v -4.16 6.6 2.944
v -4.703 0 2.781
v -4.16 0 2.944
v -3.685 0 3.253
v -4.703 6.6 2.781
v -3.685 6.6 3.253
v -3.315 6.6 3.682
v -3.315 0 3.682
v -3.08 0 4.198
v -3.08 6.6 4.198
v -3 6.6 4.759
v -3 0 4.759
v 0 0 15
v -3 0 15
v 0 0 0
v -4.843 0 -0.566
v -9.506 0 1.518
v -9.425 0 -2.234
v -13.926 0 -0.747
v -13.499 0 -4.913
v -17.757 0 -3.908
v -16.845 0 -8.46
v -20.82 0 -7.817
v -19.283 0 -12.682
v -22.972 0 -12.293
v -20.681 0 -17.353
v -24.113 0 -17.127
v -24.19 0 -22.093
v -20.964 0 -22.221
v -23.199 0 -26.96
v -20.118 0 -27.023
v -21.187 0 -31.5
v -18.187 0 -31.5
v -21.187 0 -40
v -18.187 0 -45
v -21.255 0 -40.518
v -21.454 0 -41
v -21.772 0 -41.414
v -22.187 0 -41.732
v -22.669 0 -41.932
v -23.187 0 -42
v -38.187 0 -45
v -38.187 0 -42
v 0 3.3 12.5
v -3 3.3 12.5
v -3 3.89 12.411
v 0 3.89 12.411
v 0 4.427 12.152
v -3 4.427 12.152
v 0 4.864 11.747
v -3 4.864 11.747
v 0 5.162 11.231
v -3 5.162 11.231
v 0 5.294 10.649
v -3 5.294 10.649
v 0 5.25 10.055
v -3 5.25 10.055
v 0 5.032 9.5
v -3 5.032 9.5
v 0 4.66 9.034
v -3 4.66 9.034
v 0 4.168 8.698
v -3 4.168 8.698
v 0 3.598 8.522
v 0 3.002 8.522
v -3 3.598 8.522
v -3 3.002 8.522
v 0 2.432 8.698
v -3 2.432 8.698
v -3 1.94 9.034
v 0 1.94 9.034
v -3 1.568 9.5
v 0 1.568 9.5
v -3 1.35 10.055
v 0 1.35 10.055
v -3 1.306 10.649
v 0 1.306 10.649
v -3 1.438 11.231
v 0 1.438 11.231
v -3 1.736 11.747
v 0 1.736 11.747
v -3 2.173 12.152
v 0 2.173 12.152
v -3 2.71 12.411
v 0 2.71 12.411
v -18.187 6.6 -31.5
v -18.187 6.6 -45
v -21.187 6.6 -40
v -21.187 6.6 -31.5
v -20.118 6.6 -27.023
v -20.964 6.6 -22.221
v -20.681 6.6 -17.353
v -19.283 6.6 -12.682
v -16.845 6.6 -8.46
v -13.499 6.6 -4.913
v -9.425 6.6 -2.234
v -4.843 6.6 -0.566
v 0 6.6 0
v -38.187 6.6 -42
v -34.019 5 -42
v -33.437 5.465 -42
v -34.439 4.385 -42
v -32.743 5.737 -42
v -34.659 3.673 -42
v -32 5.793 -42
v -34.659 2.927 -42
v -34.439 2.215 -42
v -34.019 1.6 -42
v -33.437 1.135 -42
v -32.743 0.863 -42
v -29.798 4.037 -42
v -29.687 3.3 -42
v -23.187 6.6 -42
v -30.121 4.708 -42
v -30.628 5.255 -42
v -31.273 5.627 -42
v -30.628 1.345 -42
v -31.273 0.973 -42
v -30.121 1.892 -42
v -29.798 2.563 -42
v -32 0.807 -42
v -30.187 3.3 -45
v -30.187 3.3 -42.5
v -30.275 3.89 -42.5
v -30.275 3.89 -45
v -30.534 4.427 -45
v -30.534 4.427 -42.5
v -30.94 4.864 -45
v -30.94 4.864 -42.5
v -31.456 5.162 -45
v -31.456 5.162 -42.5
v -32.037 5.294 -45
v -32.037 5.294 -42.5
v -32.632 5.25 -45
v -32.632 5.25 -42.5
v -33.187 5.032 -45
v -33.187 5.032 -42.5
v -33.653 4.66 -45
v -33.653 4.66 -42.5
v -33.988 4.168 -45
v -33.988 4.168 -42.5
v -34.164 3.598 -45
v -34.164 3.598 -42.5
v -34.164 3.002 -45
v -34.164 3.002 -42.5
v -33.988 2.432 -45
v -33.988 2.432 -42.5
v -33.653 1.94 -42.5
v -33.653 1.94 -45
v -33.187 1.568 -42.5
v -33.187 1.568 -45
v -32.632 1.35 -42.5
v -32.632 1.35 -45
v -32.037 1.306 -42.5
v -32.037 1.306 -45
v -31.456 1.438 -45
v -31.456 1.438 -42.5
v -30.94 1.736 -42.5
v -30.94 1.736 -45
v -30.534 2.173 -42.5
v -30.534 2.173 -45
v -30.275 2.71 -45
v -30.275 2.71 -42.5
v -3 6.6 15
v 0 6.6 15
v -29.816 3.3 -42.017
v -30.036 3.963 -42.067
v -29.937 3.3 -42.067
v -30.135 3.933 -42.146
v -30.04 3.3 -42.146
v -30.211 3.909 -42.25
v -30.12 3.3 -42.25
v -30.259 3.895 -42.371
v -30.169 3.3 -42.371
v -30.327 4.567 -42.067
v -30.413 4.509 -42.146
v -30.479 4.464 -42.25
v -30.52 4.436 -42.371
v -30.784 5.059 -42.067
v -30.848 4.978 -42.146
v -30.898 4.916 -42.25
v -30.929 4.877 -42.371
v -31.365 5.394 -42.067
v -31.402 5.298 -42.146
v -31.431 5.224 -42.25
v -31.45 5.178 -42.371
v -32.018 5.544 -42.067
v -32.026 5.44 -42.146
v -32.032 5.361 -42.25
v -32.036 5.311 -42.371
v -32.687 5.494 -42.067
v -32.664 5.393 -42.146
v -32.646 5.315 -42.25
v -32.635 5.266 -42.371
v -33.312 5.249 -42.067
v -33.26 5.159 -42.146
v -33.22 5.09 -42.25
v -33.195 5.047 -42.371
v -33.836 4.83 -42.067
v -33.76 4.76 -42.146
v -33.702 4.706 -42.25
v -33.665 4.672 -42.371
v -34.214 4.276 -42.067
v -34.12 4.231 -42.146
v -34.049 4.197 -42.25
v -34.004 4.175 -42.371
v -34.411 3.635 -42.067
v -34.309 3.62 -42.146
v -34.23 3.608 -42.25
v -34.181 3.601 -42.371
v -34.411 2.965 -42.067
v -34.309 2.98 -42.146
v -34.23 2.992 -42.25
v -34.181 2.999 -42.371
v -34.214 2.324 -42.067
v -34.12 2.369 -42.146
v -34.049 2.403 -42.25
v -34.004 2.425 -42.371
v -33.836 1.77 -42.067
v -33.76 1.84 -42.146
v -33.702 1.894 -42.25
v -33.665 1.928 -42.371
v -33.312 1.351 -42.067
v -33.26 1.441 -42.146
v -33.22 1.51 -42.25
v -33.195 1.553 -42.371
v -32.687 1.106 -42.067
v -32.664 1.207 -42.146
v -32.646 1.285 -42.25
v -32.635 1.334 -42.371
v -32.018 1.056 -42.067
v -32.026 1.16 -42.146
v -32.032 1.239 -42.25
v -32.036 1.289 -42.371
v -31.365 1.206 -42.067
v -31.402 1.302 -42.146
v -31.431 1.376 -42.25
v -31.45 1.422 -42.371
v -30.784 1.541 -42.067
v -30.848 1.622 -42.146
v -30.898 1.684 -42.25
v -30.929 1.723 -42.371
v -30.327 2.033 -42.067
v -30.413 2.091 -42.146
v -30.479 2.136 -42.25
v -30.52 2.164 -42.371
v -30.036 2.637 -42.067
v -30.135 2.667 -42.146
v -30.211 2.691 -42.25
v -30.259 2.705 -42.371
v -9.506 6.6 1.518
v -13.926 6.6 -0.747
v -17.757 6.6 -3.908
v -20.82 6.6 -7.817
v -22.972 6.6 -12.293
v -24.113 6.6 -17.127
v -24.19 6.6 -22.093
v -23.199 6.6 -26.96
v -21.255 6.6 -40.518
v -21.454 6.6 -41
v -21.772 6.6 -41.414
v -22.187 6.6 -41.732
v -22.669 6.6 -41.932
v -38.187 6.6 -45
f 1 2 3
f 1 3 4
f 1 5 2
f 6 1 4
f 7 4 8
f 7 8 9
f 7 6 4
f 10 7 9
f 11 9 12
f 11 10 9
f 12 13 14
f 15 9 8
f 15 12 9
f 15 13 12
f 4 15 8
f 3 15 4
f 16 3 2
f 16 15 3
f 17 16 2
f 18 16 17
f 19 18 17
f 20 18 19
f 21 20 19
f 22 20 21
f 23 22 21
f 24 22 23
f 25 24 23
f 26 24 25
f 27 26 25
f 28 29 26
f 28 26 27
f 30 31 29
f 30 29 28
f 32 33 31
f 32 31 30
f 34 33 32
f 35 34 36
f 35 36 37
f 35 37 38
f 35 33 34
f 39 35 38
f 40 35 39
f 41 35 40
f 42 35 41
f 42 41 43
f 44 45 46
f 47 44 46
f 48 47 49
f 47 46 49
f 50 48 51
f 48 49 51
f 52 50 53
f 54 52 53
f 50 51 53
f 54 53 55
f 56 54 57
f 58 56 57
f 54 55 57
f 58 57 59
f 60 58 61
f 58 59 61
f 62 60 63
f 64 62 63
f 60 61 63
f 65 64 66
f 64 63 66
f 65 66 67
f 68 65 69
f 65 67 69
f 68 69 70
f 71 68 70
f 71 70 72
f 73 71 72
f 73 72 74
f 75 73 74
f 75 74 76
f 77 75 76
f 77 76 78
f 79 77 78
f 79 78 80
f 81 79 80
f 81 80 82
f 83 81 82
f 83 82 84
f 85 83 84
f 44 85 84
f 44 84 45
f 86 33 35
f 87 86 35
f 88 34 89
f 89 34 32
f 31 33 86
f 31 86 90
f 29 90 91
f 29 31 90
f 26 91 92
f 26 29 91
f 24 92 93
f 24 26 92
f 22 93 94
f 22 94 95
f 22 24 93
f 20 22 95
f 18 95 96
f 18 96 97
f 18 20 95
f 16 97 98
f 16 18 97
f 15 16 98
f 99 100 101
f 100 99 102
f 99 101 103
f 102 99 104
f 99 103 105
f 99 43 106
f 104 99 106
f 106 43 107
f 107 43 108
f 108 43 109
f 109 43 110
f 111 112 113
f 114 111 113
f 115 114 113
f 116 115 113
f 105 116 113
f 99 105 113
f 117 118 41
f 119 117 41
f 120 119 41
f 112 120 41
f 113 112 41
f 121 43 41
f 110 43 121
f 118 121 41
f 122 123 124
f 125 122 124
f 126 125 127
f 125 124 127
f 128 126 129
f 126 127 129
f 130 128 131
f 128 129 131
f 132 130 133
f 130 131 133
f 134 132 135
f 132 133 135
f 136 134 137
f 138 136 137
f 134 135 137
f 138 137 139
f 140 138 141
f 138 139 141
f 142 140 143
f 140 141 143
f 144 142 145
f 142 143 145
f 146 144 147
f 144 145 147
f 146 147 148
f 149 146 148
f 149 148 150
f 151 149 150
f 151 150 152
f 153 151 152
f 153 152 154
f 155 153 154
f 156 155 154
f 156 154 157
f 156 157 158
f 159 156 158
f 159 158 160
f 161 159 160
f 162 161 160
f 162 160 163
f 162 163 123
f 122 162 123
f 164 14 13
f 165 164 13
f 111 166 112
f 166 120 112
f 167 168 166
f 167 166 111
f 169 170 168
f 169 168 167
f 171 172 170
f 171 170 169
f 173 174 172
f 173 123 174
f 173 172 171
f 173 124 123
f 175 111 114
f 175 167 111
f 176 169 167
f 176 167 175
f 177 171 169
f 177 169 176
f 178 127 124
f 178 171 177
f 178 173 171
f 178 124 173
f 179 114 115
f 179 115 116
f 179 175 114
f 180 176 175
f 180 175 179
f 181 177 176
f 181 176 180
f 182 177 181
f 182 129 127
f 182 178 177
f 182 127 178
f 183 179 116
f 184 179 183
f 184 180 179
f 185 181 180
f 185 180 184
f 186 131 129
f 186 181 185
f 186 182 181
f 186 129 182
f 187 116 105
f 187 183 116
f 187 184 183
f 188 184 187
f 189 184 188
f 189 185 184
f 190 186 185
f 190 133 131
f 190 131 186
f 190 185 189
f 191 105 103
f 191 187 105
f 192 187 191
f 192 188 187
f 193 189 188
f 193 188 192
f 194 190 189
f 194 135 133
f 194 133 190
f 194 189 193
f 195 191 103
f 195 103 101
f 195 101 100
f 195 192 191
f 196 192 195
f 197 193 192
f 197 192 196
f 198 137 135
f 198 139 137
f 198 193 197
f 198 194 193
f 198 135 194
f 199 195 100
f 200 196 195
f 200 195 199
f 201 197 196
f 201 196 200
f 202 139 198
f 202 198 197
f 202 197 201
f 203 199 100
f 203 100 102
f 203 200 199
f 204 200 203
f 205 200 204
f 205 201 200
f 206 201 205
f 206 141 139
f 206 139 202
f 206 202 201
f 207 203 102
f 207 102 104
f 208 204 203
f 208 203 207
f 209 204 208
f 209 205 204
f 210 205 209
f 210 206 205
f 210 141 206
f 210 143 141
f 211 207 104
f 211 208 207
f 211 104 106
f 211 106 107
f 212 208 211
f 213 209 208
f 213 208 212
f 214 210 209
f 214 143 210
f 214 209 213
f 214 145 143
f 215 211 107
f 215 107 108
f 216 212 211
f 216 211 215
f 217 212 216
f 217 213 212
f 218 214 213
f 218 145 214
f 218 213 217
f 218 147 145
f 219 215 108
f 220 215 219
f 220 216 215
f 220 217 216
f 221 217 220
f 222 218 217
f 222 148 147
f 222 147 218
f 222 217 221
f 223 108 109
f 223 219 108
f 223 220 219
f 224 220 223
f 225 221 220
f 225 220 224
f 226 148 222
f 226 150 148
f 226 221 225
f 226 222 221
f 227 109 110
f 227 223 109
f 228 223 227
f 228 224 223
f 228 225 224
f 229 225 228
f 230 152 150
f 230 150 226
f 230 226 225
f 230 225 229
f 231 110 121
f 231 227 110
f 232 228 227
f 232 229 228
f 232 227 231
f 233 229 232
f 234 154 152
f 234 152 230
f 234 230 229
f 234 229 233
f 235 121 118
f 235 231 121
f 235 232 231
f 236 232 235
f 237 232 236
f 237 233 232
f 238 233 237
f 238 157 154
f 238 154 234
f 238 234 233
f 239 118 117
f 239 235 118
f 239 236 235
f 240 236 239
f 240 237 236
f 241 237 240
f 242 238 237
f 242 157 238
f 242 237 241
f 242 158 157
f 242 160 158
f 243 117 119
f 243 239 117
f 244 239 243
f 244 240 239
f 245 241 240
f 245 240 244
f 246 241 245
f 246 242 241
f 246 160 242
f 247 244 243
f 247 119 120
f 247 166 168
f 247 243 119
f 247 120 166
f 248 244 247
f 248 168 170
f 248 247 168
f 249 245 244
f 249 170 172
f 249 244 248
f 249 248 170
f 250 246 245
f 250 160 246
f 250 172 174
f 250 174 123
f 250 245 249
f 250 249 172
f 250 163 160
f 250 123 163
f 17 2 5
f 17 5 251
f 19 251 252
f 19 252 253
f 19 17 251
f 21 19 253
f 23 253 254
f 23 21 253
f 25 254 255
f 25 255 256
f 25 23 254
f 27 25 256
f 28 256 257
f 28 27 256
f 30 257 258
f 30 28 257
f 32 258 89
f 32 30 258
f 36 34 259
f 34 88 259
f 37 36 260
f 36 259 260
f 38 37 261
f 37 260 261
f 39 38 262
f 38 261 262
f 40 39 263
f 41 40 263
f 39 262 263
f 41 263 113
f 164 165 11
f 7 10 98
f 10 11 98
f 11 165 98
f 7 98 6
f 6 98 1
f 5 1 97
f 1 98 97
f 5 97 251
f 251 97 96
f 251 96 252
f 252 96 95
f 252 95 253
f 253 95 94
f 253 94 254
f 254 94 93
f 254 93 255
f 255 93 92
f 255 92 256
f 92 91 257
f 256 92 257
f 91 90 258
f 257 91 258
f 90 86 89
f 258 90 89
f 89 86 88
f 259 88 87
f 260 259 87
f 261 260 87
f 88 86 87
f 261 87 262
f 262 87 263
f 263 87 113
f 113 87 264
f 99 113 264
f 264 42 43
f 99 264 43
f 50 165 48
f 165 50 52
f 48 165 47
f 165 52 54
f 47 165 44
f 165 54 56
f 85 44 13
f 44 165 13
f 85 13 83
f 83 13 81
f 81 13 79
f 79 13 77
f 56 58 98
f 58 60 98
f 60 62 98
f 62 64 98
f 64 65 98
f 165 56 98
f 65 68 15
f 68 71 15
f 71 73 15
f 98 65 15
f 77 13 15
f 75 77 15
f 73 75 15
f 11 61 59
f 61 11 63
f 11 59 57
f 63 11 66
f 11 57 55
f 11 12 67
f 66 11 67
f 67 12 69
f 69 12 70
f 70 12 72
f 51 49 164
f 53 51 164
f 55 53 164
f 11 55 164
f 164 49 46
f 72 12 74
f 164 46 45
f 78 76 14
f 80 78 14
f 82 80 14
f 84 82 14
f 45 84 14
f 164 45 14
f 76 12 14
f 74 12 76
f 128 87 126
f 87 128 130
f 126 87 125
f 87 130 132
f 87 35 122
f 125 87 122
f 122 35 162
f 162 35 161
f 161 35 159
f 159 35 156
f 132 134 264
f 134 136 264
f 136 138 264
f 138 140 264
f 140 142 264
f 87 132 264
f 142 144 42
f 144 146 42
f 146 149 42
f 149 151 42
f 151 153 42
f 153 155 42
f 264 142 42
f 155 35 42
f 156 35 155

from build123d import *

# Parameters (mm, degrees)
BOSS_EXTRUDE1_DEPTH = 6.6
SKETCH4_R           = 2
CUT_EXTRUDE1_DEPTH  = 6.6
FILLET1_R           = 2
FILLET2_R           = 0.5
FILLET3_R           = 2
SKETCH5_R           = 2
CUT_EXTRUDE2_DEPTH  = 6.6


with BuildPart() as part:
    # Sketch3 → Boss-Extrude1 (new body)
    with BuildSketch(Plane(origin=(0, 0, 0), x_dir=(1, 0, 0), z_dir=(0, 1, 0))):
        with BuildLine():
            ThreePointArc((-18.186533479, 31.5), (-18.186533479, 10.5), (0, 0))
            Line((0, 0), (0, -3))
            ThreePointArc((0, -3), (-20.888208397, 7.927851418), (-21.186533479, 31.5))
            Line((-21.186533479, 31.5), (-18.186533479, 31.5))
        make_face()
        Polygon((-38.186533479, 42), (-21.186533479, 42), (-21.186533479, 31.5), (-18.186533479, 31.5), (-18.186533479, 45), (-38.186533479, 45), align=None)
        with BuildLine():
            Line((0, -15), (0, -3))
            ThreePointArc((0, -3), (-1.5004505, -3.035167191), (-3, -2.972399899))
            Line((-3, -2.972399899), (-3, -15))
            Line((-3, -15), (0, -15))
        make_face()
    extrude(amount=BOSS_EXTRUDE1_DEPTH)

    # Sketch4 → Cut-Extrude1 (cut)
    with BuildSketch(Plane.XY.offset(-42)):
        with Locations((-32.186533479, 3.3)):
            Circle(SKETCH4_R)
    extrude(amount=-CUT_EXTRUDE1_DEPTH, mode=Mode.SUBTRACT)

    # Fillet1
    fillet1_edges = [part.edges().sort_by_distance(p)[0] for p in [
        (-21.186533479, 3.3, -42),
    ]]
    fillet(fillet1_edges, radius=FILLET1_R)

    # Fillet2
    fillet2_edges = [part.edges().sort_by_distance(p)[0] for p in [
        (-34.186533479, 3.3, -42),
    ]]
    fillet(fillet2_edges, radius=FILLET2_R)

    # Fillet3
    fillet3_edges = [part.edges().sort_by_distance(p)[0] for p in [
        (-3, 3.3, 2.972399899),
    ]]
    fillet(fillet3_edges, radius=FILLET3_R)

    # Sketch5 → Cut-Extrude2 (cut)
    with BuildSketch(Plane.ZY.offset(3)):
        with Locations((10.5, 3.3)):
            Circle(SKETCH5_R)
    extrude(amount=-CUT_EXTRUDE2_DEPTH, mode=Mode.SUBTRACT)


solid = part.part
